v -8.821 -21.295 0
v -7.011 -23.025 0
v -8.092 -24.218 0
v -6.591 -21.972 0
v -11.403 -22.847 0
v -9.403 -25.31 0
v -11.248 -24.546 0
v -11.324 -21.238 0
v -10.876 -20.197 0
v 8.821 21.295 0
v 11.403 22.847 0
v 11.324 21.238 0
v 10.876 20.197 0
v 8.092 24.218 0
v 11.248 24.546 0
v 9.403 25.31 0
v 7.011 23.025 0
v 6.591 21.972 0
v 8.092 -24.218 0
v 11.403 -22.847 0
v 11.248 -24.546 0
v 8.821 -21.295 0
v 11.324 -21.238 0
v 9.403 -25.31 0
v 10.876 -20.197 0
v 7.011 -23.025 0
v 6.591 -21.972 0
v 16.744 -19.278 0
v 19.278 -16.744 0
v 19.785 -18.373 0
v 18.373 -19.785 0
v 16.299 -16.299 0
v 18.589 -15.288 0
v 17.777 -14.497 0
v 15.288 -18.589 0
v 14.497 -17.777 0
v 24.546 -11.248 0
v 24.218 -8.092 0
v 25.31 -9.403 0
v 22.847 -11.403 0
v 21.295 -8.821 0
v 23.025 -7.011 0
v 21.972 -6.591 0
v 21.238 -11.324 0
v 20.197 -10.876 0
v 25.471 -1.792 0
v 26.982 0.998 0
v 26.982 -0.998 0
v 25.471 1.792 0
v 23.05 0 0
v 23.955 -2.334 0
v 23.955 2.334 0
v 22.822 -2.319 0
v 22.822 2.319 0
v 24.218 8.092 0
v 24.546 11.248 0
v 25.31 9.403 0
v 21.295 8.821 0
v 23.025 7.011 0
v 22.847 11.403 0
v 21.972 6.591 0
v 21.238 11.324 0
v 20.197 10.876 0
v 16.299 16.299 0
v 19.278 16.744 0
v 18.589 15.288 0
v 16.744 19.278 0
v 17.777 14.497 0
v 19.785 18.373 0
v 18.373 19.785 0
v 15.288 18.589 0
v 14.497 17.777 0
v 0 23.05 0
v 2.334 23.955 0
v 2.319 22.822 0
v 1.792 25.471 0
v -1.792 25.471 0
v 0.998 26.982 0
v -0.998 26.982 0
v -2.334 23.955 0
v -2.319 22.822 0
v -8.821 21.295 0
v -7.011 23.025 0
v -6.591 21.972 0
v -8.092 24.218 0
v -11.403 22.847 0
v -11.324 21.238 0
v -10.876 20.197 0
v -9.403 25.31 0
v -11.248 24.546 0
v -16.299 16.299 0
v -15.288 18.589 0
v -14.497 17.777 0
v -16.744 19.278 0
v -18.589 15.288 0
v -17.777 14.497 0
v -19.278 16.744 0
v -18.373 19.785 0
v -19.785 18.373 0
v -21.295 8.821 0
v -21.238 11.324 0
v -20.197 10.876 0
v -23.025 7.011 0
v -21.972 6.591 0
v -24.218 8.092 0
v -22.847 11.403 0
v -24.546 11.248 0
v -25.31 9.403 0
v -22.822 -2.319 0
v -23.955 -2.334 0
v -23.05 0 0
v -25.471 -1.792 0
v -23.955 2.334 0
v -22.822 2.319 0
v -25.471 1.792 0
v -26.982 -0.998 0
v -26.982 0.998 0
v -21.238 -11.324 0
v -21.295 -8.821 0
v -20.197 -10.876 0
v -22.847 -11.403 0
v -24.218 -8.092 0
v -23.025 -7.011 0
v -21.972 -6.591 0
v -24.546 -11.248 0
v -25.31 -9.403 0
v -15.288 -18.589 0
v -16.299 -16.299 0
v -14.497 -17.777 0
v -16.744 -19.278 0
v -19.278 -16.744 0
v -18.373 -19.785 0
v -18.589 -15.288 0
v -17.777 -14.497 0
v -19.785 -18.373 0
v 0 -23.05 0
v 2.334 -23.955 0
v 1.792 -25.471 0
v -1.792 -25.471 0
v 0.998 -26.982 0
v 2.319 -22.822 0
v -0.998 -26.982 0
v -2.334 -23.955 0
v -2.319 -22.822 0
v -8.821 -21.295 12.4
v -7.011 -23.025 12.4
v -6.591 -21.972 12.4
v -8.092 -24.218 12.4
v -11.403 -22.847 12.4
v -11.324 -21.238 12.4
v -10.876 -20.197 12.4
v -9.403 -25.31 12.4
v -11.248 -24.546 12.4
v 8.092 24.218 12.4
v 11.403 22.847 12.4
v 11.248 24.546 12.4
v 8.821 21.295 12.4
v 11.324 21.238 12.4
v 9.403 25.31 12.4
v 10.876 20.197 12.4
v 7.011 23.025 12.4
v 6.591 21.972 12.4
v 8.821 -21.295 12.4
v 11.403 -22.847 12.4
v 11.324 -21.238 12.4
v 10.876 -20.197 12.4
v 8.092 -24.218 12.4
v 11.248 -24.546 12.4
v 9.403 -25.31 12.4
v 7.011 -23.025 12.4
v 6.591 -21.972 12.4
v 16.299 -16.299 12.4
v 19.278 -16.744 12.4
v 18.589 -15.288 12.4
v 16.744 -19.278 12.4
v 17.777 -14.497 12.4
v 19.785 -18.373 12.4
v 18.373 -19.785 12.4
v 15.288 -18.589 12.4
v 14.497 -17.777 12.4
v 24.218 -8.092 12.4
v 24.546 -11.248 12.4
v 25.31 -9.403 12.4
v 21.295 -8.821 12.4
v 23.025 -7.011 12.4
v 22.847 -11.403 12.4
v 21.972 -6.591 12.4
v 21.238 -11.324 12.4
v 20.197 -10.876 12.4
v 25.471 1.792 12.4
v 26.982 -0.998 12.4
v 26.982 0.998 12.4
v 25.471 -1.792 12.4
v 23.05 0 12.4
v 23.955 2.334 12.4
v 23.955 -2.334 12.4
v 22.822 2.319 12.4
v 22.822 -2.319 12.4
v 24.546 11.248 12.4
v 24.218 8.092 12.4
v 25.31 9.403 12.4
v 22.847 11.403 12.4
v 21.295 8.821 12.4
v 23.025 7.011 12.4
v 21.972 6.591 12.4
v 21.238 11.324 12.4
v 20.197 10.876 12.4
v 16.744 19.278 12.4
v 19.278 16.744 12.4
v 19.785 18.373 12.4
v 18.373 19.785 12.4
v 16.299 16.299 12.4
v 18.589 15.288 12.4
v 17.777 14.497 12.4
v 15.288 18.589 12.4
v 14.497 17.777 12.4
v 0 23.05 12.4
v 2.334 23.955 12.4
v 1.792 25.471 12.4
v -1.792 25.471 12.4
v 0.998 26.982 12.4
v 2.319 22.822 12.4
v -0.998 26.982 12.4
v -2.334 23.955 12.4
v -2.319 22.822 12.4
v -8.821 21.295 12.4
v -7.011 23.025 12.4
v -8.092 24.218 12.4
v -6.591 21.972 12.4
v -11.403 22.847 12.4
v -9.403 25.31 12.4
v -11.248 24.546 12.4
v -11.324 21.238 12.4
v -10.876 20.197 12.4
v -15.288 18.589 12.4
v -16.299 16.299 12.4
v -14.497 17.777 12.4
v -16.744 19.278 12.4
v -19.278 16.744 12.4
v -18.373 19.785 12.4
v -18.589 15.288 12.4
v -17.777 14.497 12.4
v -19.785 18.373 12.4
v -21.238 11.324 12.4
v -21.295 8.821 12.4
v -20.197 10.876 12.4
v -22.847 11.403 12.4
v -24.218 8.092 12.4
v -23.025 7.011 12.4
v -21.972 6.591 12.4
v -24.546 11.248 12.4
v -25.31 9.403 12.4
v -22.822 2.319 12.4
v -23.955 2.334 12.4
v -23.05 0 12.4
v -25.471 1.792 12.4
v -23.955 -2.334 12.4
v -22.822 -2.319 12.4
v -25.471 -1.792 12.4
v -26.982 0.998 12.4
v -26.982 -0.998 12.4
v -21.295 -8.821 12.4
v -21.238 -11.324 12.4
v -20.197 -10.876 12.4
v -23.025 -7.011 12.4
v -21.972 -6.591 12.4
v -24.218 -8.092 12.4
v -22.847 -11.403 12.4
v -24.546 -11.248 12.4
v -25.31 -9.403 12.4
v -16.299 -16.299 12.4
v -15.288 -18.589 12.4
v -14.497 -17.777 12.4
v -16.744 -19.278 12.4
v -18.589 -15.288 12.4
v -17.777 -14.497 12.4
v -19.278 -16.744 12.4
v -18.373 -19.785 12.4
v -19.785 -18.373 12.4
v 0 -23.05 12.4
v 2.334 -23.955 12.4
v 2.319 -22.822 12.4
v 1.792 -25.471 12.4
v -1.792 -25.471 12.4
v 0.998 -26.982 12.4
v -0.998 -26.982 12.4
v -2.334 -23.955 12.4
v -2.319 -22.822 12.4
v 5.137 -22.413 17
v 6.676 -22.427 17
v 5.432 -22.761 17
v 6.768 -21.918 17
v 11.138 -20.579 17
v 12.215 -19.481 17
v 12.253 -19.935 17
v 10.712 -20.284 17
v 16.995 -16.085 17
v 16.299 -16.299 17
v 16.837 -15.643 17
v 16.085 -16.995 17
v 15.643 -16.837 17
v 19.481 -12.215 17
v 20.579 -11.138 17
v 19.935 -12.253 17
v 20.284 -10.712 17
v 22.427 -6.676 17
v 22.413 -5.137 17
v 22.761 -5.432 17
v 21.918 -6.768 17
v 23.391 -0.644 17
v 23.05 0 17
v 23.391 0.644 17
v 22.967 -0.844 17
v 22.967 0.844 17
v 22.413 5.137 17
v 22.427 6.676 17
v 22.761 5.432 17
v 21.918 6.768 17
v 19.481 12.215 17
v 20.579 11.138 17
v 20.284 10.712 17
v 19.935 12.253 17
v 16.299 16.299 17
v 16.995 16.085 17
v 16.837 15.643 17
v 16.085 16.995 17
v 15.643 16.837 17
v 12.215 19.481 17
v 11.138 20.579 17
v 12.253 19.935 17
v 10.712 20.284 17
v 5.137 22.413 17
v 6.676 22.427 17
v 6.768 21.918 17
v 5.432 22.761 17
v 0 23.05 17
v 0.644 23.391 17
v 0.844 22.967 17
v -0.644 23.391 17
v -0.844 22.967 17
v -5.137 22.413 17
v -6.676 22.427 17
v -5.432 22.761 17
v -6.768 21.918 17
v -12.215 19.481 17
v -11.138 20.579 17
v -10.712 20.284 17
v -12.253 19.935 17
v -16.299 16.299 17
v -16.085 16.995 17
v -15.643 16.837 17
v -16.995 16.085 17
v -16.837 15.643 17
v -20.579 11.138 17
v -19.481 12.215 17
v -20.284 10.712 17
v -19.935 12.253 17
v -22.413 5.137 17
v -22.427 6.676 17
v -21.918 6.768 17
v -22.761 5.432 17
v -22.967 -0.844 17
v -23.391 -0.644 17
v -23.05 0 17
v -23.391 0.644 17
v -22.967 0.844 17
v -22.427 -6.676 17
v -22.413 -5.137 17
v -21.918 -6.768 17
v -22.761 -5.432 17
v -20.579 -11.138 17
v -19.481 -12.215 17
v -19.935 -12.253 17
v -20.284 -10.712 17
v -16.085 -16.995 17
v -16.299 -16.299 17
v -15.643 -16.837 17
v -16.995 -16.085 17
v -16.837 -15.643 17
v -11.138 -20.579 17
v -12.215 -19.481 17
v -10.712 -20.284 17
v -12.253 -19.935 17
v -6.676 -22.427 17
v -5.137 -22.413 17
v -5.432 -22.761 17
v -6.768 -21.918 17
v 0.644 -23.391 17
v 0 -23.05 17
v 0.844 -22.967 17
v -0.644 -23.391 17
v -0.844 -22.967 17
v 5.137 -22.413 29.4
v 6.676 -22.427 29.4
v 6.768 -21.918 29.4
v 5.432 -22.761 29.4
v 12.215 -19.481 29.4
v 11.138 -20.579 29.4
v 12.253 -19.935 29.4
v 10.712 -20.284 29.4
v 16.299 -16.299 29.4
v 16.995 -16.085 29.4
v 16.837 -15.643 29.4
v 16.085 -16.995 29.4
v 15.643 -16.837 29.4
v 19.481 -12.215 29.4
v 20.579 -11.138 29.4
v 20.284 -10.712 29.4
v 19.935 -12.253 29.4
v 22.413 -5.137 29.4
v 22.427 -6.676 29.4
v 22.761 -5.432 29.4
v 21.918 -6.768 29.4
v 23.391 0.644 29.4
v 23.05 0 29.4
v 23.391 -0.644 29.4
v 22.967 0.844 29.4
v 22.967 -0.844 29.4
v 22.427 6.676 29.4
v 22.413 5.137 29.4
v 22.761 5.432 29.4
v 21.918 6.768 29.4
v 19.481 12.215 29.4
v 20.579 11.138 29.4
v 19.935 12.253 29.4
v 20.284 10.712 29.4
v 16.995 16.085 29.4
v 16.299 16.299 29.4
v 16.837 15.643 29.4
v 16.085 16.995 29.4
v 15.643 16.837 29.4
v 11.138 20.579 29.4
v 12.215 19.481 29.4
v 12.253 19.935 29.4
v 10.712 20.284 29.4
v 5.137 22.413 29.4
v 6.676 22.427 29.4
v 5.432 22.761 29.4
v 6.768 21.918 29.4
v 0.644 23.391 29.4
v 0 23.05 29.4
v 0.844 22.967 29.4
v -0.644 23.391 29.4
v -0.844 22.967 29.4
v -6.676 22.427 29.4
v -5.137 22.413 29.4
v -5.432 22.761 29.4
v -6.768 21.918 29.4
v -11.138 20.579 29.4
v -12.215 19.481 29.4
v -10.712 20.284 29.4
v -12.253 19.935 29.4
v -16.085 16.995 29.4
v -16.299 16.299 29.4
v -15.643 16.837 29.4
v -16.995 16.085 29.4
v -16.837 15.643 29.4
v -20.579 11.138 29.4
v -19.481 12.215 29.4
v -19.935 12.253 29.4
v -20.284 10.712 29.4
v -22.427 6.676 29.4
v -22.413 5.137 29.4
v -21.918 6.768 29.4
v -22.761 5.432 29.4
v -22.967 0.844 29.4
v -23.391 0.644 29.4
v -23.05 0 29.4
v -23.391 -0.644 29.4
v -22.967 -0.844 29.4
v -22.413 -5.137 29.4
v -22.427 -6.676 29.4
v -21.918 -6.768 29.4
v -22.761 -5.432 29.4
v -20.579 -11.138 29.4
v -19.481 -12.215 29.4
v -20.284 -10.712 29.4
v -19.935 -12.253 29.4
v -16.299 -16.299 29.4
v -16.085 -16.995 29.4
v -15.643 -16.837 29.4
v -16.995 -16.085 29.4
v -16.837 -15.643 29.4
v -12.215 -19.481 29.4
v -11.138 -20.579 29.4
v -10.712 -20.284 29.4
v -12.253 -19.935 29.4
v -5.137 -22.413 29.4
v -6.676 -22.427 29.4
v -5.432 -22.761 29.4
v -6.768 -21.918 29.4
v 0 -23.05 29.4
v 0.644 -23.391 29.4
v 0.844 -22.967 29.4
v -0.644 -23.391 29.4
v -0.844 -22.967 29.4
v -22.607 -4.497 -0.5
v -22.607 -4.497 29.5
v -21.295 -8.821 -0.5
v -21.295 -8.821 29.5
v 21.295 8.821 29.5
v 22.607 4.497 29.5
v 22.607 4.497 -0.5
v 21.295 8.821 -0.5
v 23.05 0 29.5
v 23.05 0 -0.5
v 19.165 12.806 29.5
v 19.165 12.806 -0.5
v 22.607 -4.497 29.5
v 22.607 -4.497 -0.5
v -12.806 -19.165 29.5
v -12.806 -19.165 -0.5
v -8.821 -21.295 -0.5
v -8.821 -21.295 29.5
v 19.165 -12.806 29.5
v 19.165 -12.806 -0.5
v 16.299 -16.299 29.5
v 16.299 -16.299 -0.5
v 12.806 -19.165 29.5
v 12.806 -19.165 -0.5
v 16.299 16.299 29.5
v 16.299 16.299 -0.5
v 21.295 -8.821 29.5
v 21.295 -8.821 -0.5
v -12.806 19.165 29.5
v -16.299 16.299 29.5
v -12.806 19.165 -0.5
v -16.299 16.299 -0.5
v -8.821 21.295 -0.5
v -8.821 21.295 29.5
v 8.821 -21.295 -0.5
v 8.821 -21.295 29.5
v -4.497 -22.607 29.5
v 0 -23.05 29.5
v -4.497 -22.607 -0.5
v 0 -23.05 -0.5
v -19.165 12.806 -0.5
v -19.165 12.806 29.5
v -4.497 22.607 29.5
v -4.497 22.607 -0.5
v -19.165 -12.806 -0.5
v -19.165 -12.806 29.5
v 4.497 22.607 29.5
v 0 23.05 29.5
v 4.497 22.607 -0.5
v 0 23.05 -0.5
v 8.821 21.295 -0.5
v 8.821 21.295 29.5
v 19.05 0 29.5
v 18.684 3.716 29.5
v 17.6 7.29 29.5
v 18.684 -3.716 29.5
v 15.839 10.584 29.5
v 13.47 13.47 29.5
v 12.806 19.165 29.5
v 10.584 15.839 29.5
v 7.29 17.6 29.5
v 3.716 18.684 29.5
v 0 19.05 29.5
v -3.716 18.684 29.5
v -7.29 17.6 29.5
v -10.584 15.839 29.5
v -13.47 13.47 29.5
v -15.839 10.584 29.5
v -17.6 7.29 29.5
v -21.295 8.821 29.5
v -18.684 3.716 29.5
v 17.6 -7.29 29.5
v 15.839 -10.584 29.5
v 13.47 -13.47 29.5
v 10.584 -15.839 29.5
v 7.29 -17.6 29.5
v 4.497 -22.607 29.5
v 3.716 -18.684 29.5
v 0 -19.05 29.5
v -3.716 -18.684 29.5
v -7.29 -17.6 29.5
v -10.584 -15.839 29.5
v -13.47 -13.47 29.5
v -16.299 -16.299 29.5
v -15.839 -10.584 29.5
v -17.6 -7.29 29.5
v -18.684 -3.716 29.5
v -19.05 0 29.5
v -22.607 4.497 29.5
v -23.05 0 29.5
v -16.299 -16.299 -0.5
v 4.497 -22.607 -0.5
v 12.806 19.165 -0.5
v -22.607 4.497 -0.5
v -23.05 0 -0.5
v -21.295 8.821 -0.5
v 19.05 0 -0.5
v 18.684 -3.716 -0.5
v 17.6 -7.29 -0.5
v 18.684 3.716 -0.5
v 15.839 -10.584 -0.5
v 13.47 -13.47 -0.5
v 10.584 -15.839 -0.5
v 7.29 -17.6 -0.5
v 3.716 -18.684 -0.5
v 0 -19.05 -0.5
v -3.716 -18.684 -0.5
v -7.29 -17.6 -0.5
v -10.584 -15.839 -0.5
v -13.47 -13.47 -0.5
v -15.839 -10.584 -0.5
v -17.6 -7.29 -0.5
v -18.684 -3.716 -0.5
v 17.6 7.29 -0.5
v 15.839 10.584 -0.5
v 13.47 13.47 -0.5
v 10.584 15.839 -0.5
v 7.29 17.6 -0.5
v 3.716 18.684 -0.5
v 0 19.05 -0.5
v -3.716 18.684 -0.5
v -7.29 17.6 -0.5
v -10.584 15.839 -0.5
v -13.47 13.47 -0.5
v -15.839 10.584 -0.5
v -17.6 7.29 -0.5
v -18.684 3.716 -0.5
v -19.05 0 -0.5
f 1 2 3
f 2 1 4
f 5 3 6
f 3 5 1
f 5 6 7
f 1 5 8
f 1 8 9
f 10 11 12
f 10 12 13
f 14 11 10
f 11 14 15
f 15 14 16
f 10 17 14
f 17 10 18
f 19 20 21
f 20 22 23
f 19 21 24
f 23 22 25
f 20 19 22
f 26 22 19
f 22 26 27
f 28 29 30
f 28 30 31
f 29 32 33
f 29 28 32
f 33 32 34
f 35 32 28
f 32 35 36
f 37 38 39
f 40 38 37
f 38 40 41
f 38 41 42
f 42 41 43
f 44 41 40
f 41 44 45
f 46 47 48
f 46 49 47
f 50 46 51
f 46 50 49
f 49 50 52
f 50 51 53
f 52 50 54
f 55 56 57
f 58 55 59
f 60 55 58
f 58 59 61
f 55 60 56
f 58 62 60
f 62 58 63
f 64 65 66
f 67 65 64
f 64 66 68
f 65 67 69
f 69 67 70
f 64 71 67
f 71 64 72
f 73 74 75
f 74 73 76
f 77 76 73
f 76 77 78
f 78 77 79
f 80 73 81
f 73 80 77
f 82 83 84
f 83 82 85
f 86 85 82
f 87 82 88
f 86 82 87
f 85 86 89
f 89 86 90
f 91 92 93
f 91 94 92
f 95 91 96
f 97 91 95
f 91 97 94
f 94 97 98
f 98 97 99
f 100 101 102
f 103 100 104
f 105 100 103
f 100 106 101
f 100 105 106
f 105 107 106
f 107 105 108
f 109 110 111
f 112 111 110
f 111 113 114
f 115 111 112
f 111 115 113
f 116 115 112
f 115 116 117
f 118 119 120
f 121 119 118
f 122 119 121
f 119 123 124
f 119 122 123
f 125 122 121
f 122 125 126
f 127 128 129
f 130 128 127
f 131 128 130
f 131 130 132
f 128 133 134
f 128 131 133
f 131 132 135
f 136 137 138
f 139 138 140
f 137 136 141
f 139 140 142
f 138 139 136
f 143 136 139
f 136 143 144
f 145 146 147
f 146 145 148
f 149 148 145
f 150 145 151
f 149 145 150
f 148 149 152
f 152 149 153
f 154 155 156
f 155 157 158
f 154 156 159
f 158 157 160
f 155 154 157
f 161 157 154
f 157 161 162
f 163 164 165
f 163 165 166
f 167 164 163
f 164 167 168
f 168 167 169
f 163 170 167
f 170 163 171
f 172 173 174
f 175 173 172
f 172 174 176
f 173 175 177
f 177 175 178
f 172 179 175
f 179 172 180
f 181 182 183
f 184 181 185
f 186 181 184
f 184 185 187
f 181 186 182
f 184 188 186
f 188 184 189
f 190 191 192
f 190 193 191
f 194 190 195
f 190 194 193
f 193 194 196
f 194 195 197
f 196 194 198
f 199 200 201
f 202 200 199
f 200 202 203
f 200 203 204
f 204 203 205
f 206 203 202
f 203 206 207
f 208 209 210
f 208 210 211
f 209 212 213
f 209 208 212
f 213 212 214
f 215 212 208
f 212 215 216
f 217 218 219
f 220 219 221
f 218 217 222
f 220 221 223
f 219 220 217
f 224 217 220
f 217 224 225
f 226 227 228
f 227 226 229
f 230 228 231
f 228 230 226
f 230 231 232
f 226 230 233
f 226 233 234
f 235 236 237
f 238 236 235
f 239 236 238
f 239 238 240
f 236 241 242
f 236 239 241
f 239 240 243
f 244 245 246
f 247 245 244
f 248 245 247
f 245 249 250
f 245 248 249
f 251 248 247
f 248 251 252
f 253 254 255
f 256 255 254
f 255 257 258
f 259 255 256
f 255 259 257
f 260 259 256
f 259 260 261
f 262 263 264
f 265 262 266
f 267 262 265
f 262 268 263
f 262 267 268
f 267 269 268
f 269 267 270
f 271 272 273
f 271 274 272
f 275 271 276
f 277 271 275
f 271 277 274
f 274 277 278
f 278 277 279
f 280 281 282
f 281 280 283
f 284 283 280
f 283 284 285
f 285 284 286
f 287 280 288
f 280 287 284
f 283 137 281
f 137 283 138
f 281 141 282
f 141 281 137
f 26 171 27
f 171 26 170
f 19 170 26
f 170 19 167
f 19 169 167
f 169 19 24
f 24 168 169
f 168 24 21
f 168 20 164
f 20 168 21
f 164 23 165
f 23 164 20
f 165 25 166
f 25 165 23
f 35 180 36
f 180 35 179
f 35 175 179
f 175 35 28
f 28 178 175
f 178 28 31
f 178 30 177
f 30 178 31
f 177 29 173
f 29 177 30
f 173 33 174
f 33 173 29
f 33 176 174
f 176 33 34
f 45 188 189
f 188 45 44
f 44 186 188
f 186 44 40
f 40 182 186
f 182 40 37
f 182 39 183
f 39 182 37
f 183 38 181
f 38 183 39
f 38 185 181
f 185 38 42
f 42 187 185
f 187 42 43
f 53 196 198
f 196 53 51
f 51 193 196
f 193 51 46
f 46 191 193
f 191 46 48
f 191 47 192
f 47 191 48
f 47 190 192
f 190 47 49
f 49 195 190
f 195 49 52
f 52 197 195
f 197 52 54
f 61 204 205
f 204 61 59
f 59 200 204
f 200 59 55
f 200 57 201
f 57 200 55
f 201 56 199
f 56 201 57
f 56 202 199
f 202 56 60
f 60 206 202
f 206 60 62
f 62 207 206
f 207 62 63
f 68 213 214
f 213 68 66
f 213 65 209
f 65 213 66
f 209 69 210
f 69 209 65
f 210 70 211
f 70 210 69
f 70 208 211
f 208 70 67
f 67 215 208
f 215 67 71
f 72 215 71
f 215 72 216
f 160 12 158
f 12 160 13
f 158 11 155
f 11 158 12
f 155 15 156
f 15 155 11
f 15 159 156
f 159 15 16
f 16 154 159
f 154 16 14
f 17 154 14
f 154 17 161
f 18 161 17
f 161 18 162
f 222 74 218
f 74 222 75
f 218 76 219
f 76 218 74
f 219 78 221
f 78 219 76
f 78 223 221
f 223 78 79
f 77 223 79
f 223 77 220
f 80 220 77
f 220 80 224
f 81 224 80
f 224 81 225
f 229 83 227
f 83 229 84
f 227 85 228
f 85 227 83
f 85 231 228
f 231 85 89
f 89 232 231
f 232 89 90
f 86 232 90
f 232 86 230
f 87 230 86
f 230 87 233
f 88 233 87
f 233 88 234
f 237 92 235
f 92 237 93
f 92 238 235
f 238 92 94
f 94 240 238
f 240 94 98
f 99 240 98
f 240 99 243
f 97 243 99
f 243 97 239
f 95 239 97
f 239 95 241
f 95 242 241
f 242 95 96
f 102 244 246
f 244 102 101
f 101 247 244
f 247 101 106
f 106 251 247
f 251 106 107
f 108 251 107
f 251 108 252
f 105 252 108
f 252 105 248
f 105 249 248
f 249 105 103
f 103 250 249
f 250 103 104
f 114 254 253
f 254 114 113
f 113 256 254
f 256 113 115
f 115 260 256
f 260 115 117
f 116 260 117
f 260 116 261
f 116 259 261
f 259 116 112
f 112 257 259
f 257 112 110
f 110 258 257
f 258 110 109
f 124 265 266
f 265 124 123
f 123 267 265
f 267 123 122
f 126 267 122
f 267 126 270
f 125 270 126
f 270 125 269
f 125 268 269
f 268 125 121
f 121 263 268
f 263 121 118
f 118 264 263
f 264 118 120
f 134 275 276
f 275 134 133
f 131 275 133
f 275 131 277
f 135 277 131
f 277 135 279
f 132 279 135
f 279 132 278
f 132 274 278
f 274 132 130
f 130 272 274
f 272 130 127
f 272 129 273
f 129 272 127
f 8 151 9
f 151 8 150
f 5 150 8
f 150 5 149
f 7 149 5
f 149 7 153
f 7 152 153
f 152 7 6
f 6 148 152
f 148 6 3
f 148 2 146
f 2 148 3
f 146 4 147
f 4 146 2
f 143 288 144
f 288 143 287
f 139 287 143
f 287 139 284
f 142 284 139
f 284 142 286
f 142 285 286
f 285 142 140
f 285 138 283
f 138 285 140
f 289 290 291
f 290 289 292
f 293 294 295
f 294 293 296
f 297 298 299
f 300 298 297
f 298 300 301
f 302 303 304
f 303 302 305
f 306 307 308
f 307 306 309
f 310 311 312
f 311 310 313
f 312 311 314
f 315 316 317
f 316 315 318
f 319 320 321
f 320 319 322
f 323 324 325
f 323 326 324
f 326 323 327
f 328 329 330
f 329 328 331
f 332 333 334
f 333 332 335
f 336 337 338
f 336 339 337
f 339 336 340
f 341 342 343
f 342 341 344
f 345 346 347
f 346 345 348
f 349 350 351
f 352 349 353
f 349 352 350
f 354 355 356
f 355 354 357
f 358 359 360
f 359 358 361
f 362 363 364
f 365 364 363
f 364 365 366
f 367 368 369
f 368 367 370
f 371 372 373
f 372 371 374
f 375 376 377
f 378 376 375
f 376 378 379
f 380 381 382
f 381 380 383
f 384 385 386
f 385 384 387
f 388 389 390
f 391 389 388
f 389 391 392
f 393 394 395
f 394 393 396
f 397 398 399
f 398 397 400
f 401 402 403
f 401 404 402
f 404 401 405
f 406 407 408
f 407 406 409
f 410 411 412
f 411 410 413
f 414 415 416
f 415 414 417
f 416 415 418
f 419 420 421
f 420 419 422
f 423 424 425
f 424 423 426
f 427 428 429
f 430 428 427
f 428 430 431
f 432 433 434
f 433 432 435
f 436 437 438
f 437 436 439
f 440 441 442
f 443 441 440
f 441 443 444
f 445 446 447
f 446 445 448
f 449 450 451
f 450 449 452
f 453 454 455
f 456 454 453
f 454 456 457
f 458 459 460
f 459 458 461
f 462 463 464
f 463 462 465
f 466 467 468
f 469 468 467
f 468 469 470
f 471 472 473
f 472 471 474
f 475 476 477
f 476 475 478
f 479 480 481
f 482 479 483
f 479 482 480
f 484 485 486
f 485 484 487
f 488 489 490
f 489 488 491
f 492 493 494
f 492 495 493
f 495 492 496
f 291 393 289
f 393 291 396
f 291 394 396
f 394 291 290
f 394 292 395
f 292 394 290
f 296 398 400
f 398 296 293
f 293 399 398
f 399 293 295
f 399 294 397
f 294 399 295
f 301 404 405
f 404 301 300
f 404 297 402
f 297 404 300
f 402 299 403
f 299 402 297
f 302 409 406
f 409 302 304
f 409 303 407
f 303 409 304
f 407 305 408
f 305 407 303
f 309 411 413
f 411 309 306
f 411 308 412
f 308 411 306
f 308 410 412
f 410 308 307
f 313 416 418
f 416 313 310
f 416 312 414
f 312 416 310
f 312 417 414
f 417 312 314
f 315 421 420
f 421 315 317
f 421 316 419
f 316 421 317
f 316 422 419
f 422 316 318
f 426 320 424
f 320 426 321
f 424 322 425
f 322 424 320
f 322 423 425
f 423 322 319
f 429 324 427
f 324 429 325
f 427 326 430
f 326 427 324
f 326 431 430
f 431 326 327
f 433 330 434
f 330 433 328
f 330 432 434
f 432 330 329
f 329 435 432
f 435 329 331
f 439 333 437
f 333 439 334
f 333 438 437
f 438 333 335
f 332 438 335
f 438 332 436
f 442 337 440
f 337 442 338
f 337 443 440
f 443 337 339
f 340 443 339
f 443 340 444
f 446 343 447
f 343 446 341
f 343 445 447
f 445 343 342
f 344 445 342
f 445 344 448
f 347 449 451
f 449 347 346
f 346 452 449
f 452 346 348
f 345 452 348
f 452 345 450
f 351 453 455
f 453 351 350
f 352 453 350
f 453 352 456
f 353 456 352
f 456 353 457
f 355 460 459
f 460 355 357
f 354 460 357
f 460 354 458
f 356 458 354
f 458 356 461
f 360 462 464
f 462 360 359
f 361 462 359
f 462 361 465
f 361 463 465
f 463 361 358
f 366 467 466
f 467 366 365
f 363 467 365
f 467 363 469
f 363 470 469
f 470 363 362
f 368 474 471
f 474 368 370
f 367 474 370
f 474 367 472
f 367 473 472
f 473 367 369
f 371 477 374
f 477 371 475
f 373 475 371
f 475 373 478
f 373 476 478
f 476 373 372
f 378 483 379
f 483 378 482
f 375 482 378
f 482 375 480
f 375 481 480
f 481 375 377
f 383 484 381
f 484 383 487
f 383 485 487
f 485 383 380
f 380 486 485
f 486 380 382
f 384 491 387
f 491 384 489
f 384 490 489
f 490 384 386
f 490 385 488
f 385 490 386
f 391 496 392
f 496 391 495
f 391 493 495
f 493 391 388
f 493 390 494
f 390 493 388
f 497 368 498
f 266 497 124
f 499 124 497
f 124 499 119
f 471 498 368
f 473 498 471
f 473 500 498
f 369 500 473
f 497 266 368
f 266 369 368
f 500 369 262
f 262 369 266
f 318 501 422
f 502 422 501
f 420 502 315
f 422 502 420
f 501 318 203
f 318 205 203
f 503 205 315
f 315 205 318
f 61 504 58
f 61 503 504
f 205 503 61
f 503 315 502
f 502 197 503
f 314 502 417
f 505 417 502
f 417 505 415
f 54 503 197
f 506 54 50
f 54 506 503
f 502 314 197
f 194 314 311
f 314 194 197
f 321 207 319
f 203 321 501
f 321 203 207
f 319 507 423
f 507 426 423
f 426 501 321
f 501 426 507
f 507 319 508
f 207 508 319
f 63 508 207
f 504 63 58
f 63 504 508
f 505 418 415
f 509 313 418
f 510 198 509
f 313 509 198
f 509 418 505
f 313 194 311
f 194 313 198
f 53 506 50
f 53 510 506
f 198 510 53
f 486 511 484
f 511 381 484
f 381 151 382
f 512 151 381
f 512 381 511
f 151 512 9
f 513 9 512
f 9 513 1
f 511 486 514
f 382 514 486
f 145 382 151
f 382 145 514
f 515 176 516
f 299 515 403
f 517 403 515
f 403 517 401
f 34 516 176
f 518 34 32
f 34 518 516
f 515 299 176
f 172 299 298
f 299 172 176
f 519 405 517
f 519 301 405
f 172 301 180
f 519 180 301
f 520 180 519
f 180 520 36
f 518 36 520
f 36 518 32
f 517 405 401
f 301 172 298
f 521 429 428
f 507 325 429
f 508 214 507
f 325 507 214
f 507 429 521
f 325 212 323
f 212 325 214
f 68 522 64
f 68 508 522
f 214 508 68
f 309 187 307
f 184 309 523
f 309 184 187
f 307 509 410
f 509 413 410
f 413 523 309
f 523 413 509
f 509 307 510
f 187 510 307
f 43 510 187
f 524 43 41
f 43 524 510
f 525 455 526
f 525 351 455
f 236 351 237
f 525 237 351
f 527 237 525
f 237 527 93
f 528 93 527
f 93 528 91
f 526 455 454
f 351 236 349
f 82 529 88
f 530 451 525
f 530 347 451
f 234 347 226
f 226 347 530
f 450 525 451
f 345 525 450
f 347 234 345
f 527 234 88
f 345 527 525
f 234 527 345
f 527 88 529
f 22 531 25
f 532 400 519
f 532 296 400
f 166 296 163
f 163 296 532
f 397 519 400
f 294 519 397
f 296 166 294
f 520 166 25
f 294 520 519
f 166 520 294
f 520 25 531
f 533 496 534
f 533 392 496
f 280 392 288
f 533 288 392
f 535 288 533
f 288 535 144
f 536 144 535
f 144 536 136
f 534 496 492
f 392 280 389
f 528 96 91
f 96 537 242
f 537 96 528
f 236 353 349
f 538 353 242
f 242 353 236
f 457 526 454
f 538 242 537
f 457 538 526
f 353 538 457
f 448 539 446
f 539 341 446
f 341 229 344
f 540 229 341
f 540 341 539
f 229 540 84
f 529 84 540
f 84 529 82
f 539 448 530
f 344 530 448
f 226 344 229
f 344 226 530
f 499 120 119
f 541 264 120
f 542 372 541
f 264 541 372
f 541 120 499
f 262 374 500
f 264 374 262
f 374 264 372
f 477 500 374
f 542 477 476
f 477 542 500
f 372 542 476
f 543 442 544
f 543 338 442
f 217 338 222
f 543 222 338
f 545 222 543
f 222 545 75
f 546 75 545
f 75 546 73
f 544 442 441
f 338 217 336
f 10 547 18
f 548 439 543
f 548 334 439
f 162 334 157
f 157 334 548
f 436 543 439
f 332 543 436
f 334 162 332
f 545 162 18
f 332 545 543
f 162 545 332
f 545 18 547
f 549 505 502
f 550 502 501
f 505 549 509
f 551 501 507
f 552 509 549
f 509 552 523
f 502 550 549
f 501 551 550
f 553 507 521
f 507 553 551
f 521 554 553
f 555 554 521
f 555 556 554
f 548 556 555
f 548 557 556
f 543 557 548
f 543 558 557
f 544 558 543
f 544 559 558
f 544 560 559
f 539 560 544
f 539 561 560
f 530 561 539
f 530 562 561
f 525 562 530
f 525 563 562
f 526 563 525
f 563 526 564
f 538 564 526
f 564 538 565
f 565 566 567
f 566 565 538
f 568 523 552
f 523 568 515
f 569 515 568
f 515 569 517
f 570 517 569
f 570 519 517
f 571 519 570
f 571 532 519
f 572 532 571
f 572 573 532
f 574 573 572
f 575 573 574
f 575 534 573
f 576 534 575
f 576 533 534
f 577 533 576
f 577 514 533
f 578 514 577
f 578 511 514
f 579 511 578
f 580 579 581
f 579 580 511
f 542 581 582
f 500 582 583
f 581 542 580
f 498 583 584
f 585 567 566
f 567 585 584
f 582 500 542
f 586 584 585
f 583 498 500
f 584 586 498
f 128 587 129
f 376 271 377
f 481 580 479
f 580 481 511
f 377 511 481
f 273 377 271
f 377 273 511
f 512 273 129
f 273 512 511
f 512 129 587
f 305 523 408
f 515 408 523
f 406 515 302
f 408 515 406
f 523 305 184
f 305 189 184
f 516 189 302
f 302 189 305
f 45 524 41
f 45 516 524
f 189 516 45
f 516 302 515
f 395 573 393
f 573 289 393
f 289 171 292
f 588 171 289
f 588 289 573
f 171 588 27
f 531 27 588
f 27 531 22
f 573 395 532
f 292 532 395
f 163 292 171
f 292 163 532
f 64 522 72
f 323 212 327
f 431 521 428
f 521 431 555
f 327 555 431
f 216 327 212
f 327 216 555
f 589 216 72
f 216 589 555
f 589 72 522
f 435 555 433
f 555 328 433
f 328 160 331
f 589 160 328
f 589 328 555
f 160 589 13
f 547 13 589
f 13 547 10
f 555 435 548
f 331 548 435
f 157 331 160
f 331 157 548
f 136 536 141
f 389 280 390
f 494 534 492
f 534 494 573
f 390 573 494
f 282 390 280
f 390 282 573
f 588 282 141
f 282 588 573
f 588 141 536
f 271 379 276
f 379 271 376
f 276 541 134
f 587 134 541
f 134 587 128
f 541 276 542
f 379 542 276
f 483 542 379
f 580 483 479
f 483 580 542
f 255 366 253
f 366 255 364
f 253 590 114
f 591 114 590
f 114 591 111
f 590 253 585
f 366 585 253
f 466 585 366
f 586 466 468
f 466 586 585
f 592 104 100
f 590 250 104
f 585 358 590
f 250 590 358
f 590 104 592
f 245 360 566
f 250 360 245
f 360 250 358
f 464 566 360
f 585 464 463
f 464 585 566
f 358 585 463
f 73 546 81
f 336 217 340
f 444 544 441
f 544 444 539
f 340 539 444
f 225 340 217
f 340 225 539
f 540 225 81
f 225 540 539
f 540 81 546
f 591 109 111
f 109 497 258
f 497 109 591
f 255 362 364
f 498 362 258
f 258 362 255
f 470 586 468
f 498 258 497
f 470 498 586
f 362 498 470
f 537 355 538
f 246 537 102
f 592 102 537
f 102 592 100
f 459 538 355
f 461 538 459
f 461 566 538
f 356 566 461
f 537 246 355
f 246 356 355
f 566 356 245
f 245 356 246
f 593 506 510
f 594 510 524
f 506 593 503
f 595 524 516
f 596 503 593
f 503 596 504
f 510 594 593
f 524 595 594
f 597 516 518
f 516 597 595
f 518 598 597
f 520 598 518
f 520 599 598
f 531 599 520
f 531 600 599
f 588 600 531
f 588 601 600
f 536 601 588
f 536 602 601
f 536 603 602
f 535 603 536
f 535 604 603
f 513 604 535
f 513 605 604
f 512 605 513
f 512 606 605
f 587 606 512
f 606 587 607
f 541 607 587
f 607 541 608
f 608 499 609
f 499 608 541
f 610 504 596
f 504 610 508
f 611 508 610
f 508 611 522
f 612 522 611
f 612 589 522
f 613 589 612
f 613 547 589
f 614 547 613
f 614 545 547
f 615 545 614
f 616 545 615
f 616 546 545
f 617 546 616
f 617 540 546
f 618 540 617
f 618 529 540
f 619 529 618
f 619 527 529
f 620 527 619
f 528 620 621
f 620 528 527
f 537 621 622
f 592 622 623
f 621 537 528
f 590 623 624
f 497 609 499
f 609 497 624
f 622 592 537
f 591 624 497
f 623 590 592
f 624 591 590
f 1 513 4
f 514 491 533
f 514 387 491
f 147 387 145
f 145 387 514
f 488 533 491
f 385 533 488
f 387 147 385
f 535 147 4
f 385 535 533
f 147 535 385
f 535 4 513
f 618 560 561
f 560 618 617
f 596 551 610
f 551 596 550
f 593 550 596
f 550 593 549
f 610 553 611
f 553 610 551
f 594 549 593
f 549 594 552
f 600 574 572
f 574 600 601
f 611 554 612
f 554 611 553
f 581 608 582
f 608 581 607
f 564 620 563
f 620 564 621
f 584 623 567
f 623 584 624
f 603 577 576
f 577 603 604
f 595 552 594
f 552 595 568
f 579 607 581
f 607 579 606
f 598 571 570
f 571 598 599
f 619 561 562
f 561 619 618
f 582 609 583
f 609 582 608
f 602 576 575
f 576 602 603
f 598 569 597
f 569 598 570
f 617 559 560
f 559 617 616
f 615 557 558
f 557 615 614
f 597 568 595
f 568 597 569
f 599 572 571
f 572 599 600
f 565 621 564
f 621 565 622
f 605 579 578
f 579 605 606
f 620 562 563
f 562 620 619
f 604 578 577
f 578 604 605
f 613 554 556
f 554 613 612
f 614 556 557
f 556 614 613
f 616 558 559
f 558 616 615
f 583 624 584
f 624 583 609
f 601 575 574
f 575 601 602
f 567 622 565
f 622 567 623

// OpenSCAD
$fn = 32;

// ----------------------------------------------------------------------
// Two-module gear rim: z16 m3 and z24 m1.8, 29 mm wide
// ----------------------------------------------------------------------

// --- parameters (mm) ---
module_a = 3;             // first tooth module
teeth_a = 16;             // first band tooth count
module_b = 1.8;           // second tooth module
teeth_b = 24;             // second band tooth count
band_h = 12;              // height of one tooth band
web_t = 5;                // web thickness between the bands
total = 29;               // overall width over both bands
root_r = 20.25;           // root radius of the coarse band
hub_r = 23.05;            // hub radius
bore_d = 38.1;            // hub bore
hole_count = 5;           // lightening holes
hole_r = 14.62;           // lightening hole circle radius
hole_d = 5.06;            // lightening hole diameter

band_a = [[20.121, -2.283], [23.955, -2.334], [25.471, -1.792], [26.982, -0.998], [26.982, 0.998], [25.471, 1.792], [23.955, 2.334], [20.121, 2.283], [19.463, 5.591], [23.025, 7.011], [24.218, 8.092], [25.31, 9.403], [24.546, 11.248], [22.847, 11.403], [21.238, 11.324], [17.716, 9.809], [15.842, 12.613], [18.589, 15.288], [19.278, 16.744], [19.785, 18.373], [18.373, 19.785], [16.744, 19.278], [15.288, 18.589], [12.613, 15.842], [9.809, 17.716], [11.324, 21.238], [11.403, 22.847], [11.248, 24.546], [9.403, 25.31], [8.092, 24.218], [7.011, 23.025], [5.591, 19.463], [2.283, 20.121], [2.334, 23.955], [1.792, 25.471], [0.998, 26.982], [-0.998, 26.982], [-1.792, 25.471], [-2.334, 23.955], [-2.283, 20.121], [-5.591, 19.463], [-7.011, 23.025], [-8.092, 24.218], [-9.403, 25.31], [-11.248, 24.546], [-11.403, 22.847], [-11.324, 21.238], [-9.809, 17.716], [-12.613, 15.842], [-15.288, 18.589], [-16.744, 19.278], [-18.373, 19.785], [-19.785, 18.373], [-19.278, 16.744], [-18.589, 15.288], [-15.842, 12.613], [-17.716, 9.809], [-21.238, 11.324], [-22.847, 11.403], [-24.546, 11.248], [-25.31, 9.403], [-24.218, 8.092], [-23.025, 7.011], [-19.463, 5.591], [-20.121, 2.283], [-23.955, 2.334], [-25.471, 1.792], [-26.982, 0.998], [-26.982, -0.998], [-25.471, -1.792], [-23.955, -2.334], [-20.121, -2.283], [-19.463, -5.591], [-23.025, -7.011], [-24.218, -8.092], [-25.31, -9.403], [-24.546, -11.248], [-22.847, -11.403], [-21.238, -11.324], [-17.716, -9.809], [-15.842, -12.613], [-18.589, -15.288], [-19.278, -16.744], [-19.785, -18.373], [-18.373, -19.785], [-16.744, -19.278], [-15.288, -18.589], [-12.613, -15.842], [-9.809, -17.716], [-11.324, -21.238], [-11.403, -22.847], [-11.248, -24.546], [-9.403, -25.31], [-8.092, -24.218], [-7.011, -23.025], [-5.591, -19.463], [-2.283, -20.121], [-2.334, -23.955], [-1.792, -25.471], [-0.998, -26.982], [0.998, -26.982], [1.792, -25.471], [2.334, -23.955], [2.283, -20.121], [5.591, -19.463], [7.011, -23.025], [8.092, -24.218], [9.403, -25.31], [11.248, -24.546], [11.403, -22.847], [11.324, -21.238], [9.809, -17.716], [12.613, -15.842], [15.288, -18.589], [16.744, -19.278], [18.373, -19.785], [19.785, -18.373], [19.278, -16.744], [18.589, -15.288], [15.842, -12.613], [17.716, -9.809], [21.238, -11.324], [22.847, -11.403], [24.546, -11.248], [25.31, -9.403], [24.218, -8.092], [23.025, -7.011], [19.463, -5.591]];
band_b = [[19.288, -1.551], [21.314, -1.478], [22.354, -1.133], [23.391, -0.644], [23.391, 0.644], [22.354, 1.133], [21.314, 1.478], [19.288, 1.551], [19.032, 3.494], [20.97, 4.089], [21.885, 4.691], [22.761, 5.432], [22.427, 6.676], [21.299, 6.88], [20.205, 6.944], [18.229, 6.49], [17.479, 8.301], [19.197, 9.377], [19.926, 10.195], [20.579, 11.138], [19.935, 12.253], [18.792, 12.158], [17.719, 11.937], [15.928, 10.987], [14.735, 12.542], [16.116, 14.026], [16.608, 15.005], [16.995, 16.085], [16.085, 16.995], [15.005, 16.608], [14.026, 16.116], [12.542, 14.735], [10.987, 15.928], [11.937, 17.719], [12.158, 18.792], [12.253, 19.935], [11.138, 20.579], [10.195, 19.926], [9.377, 19.197], [8.301, 17.479], [6.49, 18.229], [6.944, 20.205], [6.88, 21.299], [6.676, 22.427], [5.432, 22.761], [4.691, 21.885], [4.089, 20.97], [3.494, 19.032], [1.551, 19.288], [1.478, 21.314], [1.133, 22.354], [0.644, 23.391], [-0.644, 23.391], [-1.133, 22.354], [-1.478, 21.314], [-1.551, 19.288], [-3.494, 19.032], [-4.089, 20.97], [-4.691, 21.885], [-5.432, 22.761], [-6.676, 22.427], [-6.88, 21.299], [-6.944, 20.205], [-6.49, 18.229], [-8.301, 17.479], [-9.377, 19.197], [-10.195, 19.926], [-11.138, 20.579], [-12.253, 19.935], [-12.158, 18.792], [-11.937, 17.719], [-10.987, 15.928], [-12.542, 14.735], [-14.026, 16.116], [-15.005, 16.608], [-16.085, 16.995], [-16.995, 16.085], [-16.608, 15.005], [-16.116, 14.026], [-14.735, 12.542], [-15.928, 10.987], [-17.719, 11.937], [-18.792, 12.158], [-19.935, 12.253], [-20.579, 11.138], [-19.926, 10.195], [-19.197, 9.377], [-17.479, 8.301], [-18.229, 6.49], [-20.205, 6.944], [-21.299, 6.88], [-22.427, 6.676], [-22.761, 5.432], [-21.885, 4.691], [-20.97, 4.089], [-19.032, 3.494], [-19.288, 1.551], [-21.314, 1.478], [-22.354, 1.133], [-23.391, 0.644], [-23.391, -0.644], [-22.354, -1.133], [-21.314, -1.478], [-19.288, -1.551], [-19.032, -3.494], [-20.97, -4.089], [-21.885, -4.691], [-22.761, -5.432], [-22.427, -6.676], [-21.299, -6.88], [-20.205, -6.944], [-18.229, -6.49], [-17.479, -8.301], [-19.197, -9.377], [-19.926, -10.195], [-20.579, -11.138], [-19.935, -12.253], [-18.792, -12.158], [-17.719, -11.937], [-15.928, -10.987], [-14.735, -12.542], [-16.116, -14.026], [-16.608, -15.005], [-16.995, -16.085], [-16.085, -16.995], [-15.005, -16.608], [-14.026, -16.116], [-12.542, -14.735], [-10.987, -15.928], [-11.937, -17.719], [-12.158, -18.792], [-12.253, -19.935], [-11.138, -20.579], [-10.195, -19.926], [-9.377, -19.197], [-8.301, -17.479], [-6.49, -18.229], [-6.944, -20.205], [-6.88, -21.299], [-6.676, -22.427], [-5.432, -22.761], [-4.691, -21.885], [-4.089, -20.97], [-3.494, -19.032], [-1.551, -19.288], [-1.478, -21.314], [-1.133, -22.354], [-0.644, -23.391], [0.644, -23.391], [1.133, -22.354], [1.478, -21.314], [1.551, -19.288], [3.494, -19.032], [4.089, -20.97], [4.691, -21.885], [5.432, -22.761], [6.676, -22.427], [6.88, -21.299], [6.944, -20.205], [6.49, -18.229], [8.301, -17.479], [9.377, -19.197], [10.195, -19.926], [11.138, -20.579], [12.253, -19.935], [12.158, -18.792], [11.937, -17.719], [10.987, -15.928], [12.542, -14.735], [14.026, -16.116], [15.005, -16.608], [16.085, -16.995], [16.995, -16.085], [16.608, -15.005], [16.116, -14.026], [14.735, -12.542], [15.928, -10.987], [17.719, -11.937], [18.792, -12.158], [19.935, -12.253], [20.579, -11.138], [19.926, -10.195], [19.197, -9.377], [17.479, -8.301], [18.229, -6.49], [20.205, -6.944], [21.299, -6.88], [22.427, -6.676], [22.761, -5.432], [21.885, -4.691], [20.97, -4.089], [19.032, -3.494]];

difference() {
  union() {
    /* tooth band A, overlapping the web by 0.4 mm */
    linear_extrude(height = band_h + 0.4) polygon(band_a);
    /* web */
    translate([0, 0, band_h - 0.4]) cylinder(h = web_t + 0.8, d = 2 * root_r);
    /* tooth band B */
    translate([0, 0, band_h + web_t]) linear_extrude(height = band_h + 0.4) polygon(band_b);
    /* hub */
    translate([0, 0, -0.5]) cylinder(h = total + 1.0, d = 2 * hub_r);
  }
  /* bore */
  translate([0, 0, -2.5]) cylinder(h = total + 5, d = bore_d);
  /* lightening holes through the web */
  for (i = [0 : hole_count - 1]) {
    a = i * 360 / hole_count;
    translate([hole_r * cos(a), hole_r * sin(a), -2.5]) cylinder(h = total + 5, d = hole_d);
  }
}
